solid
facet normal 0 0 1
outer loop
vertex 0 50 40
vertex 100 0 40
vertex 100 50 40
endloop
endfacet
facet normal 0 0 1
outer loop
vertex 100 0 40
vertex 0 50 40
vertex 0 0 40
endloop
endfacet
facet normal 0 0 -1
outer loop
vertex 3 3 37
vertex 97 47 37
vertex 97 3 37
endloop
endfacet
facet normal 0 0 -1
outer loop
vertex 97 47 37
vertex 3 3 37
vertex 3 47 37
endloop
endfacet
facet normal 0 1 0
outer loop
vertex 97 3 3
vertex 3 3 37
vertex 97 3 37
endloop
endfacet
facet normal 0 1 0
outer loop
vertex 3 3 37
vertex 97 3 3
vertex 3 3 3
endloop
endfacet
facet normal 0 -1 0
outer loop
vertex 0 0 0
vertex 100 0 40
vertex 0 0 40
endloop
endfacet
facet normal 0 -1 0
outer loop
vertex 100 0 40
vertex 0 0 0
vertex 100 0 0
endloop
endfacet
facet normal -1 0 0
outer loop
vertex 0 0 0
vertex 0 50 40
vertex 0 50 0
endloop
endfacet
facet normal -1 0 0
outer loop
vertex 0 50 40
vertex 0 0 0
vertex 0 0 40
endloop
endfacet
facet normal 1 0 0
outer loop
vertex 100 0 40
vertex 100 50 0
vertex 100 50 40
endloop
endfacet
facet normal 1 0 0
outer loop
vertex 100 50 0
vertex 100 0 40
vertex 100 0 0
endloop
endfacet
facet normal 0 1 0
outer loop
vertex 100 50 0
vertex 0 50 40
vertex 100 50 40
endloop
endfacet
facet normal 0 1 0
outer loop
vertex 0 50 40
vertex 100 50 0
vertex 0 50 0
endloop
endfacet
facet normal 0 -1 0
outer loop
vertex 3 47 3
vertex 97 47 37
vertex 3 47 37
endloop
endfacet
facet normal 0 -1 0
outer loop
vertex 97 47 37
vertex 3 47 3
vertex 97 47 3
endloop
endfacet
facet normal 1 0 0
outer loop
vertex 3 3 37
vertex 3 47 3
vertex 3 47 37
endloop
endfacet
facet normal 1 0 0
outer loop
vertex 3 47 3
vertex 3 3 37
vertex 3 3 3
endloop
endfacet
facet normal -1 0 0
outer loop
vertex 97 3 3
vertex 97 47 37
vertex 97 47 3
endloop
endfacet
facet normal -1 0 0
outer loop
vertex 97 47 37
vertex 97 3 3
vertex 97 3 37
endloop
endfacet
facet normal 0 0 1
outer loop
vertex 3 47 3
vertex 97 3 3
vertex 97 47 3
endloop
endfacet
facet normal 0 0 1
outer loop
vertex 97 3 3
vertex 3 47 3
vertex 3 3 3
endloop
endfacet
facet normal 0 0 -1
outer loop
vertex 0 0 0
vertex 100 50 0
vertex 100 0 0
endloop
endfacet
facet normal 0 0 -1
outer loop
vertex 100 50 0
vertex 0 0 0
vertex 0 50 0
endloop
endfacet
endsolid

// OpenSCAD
// Edit the `laserbox` module further down to start creating!

// Create a line of fingers.
// w        Width of the side on which the fingers will be added.
// d        The depth of the fingers.
// t        Material thickness.
// n        Number of fingers.
// kerf     The kerf to use.
// isSide   Should be true if this is the side of a side piece.
// isTop... Should be true if this is the top or bottom row of fingers.
module fingers(w, d, t, n, kerf, isSide=false, isTopOrBottom = false)
{
    wt = w / (2 * n + 1);
        
    if (isSide)
    {
        if (isTopOrBottom)
        {
            cube([wt + kerf, d, t]);
            
            for (i = [1:(n-1)])
            {
                translate([2 * wt * i - kerf, 0, 0])
                    cube([wt + 2 * kerf, d, t]);
            }
            
            translate([2 * wt * n - kerf, 0, 0])
                cube([wt + kerf, d, t]);
        }
        else
        {
            translate([d, 0, 0])
            cube([wt + kerf - d, d, t]);
            
            for (i = [1:(n-1)])
            {
                translate([2 * wt * i - kerf, 0, 0])
                    cube([wt + 2 * kerf, d, t]);
            }
            
            translate([2 * wt * n - kerf, 0, 0])
                cube([wt + kerf - d, d, t]);
        }
    }
    else
    {
        for (i = [0:n - 1])
        {
            translate([wt + 2 * wt * i - kerf, 0, 0])
                cube([wt + 2 * kerf, d, t]);
        }
    }
}

// Create a panel for a finger box.
// w        width.
// h        length.
// t        thickness.
// edges    vector specifying the number of edges on each side (t, r, b, l).
// d        finger depth.
// isSide   Should be true if this is a side panel.
// isTop... Should be true if this is a top or bottom panel.
module panel(w, h, t, edges, kerf = 0.12, isSide=false, isTopOrBottom=false)
{
    d = t;
    translate([d, d, 0])
        cube([w - 2 * d, h - 2 * d, t]);
    
    // Top
    translate([0, h - d, 0])
        fingers(w, d, t, edges[0], kerf, !isSide, isTopOrBottom);
    
    // Right
    translate([d, 0, 0])
    rotate([0, 0, 90])
        fingers(h, d, t, edges[1], kerf, isSide);
    
    // Bottom
    fingers(w, d, t, edges[2], kerf, !isSide, isTopOrBottom);
    
    // Left
    translate([w, 0, 0])
    rotate([0, 0, 90])
        fingers(h, d, t, edges[3], kerf, isSide);
}

// Create a finger jointed box for laser cutting.
// l            Box length (x).
// w            Box width (y).
// h            Box height (z).
// t            Material thickness.
// fingerSize   Desired finger/slot size (will be changed slightly).
// kerf         Kerf to use for laser cutting (default to Epilog 60W C02 laser on 3mm MDF).
// laserCut     Lay out the sides ready for laser cutting.
module laserbox(l, w, h, t, fingerSize, kerf = 0.1, laserCut=false)
{
    // Calculate the number of fingers on each side
    nl = floor(l / fingerSize);
    nw = floor(w / fingerSize);
    nh = floor(h / fingerSize);
    
    // The following modules can be edited if you want to add additional features
    // on your box.
    
    module top()
    {
        // The top panel uses kerf=0 to make it easy to remove again.
        color("pink");
            panel(l, w, t, [nl, nw, nl, nw], kerf = 0, isSide = false, isTopOrBottom=true);
    }
    
    module bottom()
    {
        color("pink");
            panel(l, w, t, [nl, nw, nl, nw], kerf = kerf, isSide = false, isTopOrBottom=true);
    }
    
    module left()
    {
        color("blue")
            panel(h, w, t, [nh, nw, nh, nw], kerf = kerf, isSide=true);
    }
    
    module right()
    {
        color("blue")
            panel(h, w, t, [nh, nw, nh, nw], kerf = kerf, isSide=true);
    }
    
    module front()
    {
        color([0.0, 1.0, 0])
        panel(l, h, t, [nl, nh, nl, nh], kerf = kerf, isSide=true);
    }
    
    module back()
    {
        color([0.0, 1.0, 0])
        panel(l, h, t, [nl, nh, nl, nh], kerf = kerf, isSide=true);
    }
    
    if (laserCut)
    {
        top();
        
        translate([l + 1, 0, 0])
            bottom();
        
        translate([2 * (l + 1), 0, 0])
            left();
        
        translate([2 * (l + 1) + h + 1, 0, 0])
            right();
        
        translate([2 * (l + 1) + 2 * (h + 1), 0, 0])
            front();
        
        translate([2 * (l + 1) + 2 * (h + 1) + l + 1, 0, 0])
            back();
    }
    else
    {
        translate([0, 0, h - t])
        top();
    
        bottom();

        translate([l, 0, 0])
        rotate([0, -90, 0])
            left();

        translate([t, 0, 0])
        rotate([0, -90, 0])
            right();
              
        translate([0, t, 0])
        rotate([90, 0, 0])
            front();
        
        translate([0, w, 0])
        rotate([90, 0, 0])
            back();
    }
}

// To get your box ready for laser cutting:
// - Set lasetCut=true below.
// - Uncomment the `projection()` command below and render your box.
// - Choose File > Export > Export as SVG... and save an .svg file.
// - Open the .svg file in Illustrator (or other vector software) and arrange for laser cutting.

// projection()
laserbox(100, 50, 40, 3, 20, kerf=0.1, laserCut=false);
